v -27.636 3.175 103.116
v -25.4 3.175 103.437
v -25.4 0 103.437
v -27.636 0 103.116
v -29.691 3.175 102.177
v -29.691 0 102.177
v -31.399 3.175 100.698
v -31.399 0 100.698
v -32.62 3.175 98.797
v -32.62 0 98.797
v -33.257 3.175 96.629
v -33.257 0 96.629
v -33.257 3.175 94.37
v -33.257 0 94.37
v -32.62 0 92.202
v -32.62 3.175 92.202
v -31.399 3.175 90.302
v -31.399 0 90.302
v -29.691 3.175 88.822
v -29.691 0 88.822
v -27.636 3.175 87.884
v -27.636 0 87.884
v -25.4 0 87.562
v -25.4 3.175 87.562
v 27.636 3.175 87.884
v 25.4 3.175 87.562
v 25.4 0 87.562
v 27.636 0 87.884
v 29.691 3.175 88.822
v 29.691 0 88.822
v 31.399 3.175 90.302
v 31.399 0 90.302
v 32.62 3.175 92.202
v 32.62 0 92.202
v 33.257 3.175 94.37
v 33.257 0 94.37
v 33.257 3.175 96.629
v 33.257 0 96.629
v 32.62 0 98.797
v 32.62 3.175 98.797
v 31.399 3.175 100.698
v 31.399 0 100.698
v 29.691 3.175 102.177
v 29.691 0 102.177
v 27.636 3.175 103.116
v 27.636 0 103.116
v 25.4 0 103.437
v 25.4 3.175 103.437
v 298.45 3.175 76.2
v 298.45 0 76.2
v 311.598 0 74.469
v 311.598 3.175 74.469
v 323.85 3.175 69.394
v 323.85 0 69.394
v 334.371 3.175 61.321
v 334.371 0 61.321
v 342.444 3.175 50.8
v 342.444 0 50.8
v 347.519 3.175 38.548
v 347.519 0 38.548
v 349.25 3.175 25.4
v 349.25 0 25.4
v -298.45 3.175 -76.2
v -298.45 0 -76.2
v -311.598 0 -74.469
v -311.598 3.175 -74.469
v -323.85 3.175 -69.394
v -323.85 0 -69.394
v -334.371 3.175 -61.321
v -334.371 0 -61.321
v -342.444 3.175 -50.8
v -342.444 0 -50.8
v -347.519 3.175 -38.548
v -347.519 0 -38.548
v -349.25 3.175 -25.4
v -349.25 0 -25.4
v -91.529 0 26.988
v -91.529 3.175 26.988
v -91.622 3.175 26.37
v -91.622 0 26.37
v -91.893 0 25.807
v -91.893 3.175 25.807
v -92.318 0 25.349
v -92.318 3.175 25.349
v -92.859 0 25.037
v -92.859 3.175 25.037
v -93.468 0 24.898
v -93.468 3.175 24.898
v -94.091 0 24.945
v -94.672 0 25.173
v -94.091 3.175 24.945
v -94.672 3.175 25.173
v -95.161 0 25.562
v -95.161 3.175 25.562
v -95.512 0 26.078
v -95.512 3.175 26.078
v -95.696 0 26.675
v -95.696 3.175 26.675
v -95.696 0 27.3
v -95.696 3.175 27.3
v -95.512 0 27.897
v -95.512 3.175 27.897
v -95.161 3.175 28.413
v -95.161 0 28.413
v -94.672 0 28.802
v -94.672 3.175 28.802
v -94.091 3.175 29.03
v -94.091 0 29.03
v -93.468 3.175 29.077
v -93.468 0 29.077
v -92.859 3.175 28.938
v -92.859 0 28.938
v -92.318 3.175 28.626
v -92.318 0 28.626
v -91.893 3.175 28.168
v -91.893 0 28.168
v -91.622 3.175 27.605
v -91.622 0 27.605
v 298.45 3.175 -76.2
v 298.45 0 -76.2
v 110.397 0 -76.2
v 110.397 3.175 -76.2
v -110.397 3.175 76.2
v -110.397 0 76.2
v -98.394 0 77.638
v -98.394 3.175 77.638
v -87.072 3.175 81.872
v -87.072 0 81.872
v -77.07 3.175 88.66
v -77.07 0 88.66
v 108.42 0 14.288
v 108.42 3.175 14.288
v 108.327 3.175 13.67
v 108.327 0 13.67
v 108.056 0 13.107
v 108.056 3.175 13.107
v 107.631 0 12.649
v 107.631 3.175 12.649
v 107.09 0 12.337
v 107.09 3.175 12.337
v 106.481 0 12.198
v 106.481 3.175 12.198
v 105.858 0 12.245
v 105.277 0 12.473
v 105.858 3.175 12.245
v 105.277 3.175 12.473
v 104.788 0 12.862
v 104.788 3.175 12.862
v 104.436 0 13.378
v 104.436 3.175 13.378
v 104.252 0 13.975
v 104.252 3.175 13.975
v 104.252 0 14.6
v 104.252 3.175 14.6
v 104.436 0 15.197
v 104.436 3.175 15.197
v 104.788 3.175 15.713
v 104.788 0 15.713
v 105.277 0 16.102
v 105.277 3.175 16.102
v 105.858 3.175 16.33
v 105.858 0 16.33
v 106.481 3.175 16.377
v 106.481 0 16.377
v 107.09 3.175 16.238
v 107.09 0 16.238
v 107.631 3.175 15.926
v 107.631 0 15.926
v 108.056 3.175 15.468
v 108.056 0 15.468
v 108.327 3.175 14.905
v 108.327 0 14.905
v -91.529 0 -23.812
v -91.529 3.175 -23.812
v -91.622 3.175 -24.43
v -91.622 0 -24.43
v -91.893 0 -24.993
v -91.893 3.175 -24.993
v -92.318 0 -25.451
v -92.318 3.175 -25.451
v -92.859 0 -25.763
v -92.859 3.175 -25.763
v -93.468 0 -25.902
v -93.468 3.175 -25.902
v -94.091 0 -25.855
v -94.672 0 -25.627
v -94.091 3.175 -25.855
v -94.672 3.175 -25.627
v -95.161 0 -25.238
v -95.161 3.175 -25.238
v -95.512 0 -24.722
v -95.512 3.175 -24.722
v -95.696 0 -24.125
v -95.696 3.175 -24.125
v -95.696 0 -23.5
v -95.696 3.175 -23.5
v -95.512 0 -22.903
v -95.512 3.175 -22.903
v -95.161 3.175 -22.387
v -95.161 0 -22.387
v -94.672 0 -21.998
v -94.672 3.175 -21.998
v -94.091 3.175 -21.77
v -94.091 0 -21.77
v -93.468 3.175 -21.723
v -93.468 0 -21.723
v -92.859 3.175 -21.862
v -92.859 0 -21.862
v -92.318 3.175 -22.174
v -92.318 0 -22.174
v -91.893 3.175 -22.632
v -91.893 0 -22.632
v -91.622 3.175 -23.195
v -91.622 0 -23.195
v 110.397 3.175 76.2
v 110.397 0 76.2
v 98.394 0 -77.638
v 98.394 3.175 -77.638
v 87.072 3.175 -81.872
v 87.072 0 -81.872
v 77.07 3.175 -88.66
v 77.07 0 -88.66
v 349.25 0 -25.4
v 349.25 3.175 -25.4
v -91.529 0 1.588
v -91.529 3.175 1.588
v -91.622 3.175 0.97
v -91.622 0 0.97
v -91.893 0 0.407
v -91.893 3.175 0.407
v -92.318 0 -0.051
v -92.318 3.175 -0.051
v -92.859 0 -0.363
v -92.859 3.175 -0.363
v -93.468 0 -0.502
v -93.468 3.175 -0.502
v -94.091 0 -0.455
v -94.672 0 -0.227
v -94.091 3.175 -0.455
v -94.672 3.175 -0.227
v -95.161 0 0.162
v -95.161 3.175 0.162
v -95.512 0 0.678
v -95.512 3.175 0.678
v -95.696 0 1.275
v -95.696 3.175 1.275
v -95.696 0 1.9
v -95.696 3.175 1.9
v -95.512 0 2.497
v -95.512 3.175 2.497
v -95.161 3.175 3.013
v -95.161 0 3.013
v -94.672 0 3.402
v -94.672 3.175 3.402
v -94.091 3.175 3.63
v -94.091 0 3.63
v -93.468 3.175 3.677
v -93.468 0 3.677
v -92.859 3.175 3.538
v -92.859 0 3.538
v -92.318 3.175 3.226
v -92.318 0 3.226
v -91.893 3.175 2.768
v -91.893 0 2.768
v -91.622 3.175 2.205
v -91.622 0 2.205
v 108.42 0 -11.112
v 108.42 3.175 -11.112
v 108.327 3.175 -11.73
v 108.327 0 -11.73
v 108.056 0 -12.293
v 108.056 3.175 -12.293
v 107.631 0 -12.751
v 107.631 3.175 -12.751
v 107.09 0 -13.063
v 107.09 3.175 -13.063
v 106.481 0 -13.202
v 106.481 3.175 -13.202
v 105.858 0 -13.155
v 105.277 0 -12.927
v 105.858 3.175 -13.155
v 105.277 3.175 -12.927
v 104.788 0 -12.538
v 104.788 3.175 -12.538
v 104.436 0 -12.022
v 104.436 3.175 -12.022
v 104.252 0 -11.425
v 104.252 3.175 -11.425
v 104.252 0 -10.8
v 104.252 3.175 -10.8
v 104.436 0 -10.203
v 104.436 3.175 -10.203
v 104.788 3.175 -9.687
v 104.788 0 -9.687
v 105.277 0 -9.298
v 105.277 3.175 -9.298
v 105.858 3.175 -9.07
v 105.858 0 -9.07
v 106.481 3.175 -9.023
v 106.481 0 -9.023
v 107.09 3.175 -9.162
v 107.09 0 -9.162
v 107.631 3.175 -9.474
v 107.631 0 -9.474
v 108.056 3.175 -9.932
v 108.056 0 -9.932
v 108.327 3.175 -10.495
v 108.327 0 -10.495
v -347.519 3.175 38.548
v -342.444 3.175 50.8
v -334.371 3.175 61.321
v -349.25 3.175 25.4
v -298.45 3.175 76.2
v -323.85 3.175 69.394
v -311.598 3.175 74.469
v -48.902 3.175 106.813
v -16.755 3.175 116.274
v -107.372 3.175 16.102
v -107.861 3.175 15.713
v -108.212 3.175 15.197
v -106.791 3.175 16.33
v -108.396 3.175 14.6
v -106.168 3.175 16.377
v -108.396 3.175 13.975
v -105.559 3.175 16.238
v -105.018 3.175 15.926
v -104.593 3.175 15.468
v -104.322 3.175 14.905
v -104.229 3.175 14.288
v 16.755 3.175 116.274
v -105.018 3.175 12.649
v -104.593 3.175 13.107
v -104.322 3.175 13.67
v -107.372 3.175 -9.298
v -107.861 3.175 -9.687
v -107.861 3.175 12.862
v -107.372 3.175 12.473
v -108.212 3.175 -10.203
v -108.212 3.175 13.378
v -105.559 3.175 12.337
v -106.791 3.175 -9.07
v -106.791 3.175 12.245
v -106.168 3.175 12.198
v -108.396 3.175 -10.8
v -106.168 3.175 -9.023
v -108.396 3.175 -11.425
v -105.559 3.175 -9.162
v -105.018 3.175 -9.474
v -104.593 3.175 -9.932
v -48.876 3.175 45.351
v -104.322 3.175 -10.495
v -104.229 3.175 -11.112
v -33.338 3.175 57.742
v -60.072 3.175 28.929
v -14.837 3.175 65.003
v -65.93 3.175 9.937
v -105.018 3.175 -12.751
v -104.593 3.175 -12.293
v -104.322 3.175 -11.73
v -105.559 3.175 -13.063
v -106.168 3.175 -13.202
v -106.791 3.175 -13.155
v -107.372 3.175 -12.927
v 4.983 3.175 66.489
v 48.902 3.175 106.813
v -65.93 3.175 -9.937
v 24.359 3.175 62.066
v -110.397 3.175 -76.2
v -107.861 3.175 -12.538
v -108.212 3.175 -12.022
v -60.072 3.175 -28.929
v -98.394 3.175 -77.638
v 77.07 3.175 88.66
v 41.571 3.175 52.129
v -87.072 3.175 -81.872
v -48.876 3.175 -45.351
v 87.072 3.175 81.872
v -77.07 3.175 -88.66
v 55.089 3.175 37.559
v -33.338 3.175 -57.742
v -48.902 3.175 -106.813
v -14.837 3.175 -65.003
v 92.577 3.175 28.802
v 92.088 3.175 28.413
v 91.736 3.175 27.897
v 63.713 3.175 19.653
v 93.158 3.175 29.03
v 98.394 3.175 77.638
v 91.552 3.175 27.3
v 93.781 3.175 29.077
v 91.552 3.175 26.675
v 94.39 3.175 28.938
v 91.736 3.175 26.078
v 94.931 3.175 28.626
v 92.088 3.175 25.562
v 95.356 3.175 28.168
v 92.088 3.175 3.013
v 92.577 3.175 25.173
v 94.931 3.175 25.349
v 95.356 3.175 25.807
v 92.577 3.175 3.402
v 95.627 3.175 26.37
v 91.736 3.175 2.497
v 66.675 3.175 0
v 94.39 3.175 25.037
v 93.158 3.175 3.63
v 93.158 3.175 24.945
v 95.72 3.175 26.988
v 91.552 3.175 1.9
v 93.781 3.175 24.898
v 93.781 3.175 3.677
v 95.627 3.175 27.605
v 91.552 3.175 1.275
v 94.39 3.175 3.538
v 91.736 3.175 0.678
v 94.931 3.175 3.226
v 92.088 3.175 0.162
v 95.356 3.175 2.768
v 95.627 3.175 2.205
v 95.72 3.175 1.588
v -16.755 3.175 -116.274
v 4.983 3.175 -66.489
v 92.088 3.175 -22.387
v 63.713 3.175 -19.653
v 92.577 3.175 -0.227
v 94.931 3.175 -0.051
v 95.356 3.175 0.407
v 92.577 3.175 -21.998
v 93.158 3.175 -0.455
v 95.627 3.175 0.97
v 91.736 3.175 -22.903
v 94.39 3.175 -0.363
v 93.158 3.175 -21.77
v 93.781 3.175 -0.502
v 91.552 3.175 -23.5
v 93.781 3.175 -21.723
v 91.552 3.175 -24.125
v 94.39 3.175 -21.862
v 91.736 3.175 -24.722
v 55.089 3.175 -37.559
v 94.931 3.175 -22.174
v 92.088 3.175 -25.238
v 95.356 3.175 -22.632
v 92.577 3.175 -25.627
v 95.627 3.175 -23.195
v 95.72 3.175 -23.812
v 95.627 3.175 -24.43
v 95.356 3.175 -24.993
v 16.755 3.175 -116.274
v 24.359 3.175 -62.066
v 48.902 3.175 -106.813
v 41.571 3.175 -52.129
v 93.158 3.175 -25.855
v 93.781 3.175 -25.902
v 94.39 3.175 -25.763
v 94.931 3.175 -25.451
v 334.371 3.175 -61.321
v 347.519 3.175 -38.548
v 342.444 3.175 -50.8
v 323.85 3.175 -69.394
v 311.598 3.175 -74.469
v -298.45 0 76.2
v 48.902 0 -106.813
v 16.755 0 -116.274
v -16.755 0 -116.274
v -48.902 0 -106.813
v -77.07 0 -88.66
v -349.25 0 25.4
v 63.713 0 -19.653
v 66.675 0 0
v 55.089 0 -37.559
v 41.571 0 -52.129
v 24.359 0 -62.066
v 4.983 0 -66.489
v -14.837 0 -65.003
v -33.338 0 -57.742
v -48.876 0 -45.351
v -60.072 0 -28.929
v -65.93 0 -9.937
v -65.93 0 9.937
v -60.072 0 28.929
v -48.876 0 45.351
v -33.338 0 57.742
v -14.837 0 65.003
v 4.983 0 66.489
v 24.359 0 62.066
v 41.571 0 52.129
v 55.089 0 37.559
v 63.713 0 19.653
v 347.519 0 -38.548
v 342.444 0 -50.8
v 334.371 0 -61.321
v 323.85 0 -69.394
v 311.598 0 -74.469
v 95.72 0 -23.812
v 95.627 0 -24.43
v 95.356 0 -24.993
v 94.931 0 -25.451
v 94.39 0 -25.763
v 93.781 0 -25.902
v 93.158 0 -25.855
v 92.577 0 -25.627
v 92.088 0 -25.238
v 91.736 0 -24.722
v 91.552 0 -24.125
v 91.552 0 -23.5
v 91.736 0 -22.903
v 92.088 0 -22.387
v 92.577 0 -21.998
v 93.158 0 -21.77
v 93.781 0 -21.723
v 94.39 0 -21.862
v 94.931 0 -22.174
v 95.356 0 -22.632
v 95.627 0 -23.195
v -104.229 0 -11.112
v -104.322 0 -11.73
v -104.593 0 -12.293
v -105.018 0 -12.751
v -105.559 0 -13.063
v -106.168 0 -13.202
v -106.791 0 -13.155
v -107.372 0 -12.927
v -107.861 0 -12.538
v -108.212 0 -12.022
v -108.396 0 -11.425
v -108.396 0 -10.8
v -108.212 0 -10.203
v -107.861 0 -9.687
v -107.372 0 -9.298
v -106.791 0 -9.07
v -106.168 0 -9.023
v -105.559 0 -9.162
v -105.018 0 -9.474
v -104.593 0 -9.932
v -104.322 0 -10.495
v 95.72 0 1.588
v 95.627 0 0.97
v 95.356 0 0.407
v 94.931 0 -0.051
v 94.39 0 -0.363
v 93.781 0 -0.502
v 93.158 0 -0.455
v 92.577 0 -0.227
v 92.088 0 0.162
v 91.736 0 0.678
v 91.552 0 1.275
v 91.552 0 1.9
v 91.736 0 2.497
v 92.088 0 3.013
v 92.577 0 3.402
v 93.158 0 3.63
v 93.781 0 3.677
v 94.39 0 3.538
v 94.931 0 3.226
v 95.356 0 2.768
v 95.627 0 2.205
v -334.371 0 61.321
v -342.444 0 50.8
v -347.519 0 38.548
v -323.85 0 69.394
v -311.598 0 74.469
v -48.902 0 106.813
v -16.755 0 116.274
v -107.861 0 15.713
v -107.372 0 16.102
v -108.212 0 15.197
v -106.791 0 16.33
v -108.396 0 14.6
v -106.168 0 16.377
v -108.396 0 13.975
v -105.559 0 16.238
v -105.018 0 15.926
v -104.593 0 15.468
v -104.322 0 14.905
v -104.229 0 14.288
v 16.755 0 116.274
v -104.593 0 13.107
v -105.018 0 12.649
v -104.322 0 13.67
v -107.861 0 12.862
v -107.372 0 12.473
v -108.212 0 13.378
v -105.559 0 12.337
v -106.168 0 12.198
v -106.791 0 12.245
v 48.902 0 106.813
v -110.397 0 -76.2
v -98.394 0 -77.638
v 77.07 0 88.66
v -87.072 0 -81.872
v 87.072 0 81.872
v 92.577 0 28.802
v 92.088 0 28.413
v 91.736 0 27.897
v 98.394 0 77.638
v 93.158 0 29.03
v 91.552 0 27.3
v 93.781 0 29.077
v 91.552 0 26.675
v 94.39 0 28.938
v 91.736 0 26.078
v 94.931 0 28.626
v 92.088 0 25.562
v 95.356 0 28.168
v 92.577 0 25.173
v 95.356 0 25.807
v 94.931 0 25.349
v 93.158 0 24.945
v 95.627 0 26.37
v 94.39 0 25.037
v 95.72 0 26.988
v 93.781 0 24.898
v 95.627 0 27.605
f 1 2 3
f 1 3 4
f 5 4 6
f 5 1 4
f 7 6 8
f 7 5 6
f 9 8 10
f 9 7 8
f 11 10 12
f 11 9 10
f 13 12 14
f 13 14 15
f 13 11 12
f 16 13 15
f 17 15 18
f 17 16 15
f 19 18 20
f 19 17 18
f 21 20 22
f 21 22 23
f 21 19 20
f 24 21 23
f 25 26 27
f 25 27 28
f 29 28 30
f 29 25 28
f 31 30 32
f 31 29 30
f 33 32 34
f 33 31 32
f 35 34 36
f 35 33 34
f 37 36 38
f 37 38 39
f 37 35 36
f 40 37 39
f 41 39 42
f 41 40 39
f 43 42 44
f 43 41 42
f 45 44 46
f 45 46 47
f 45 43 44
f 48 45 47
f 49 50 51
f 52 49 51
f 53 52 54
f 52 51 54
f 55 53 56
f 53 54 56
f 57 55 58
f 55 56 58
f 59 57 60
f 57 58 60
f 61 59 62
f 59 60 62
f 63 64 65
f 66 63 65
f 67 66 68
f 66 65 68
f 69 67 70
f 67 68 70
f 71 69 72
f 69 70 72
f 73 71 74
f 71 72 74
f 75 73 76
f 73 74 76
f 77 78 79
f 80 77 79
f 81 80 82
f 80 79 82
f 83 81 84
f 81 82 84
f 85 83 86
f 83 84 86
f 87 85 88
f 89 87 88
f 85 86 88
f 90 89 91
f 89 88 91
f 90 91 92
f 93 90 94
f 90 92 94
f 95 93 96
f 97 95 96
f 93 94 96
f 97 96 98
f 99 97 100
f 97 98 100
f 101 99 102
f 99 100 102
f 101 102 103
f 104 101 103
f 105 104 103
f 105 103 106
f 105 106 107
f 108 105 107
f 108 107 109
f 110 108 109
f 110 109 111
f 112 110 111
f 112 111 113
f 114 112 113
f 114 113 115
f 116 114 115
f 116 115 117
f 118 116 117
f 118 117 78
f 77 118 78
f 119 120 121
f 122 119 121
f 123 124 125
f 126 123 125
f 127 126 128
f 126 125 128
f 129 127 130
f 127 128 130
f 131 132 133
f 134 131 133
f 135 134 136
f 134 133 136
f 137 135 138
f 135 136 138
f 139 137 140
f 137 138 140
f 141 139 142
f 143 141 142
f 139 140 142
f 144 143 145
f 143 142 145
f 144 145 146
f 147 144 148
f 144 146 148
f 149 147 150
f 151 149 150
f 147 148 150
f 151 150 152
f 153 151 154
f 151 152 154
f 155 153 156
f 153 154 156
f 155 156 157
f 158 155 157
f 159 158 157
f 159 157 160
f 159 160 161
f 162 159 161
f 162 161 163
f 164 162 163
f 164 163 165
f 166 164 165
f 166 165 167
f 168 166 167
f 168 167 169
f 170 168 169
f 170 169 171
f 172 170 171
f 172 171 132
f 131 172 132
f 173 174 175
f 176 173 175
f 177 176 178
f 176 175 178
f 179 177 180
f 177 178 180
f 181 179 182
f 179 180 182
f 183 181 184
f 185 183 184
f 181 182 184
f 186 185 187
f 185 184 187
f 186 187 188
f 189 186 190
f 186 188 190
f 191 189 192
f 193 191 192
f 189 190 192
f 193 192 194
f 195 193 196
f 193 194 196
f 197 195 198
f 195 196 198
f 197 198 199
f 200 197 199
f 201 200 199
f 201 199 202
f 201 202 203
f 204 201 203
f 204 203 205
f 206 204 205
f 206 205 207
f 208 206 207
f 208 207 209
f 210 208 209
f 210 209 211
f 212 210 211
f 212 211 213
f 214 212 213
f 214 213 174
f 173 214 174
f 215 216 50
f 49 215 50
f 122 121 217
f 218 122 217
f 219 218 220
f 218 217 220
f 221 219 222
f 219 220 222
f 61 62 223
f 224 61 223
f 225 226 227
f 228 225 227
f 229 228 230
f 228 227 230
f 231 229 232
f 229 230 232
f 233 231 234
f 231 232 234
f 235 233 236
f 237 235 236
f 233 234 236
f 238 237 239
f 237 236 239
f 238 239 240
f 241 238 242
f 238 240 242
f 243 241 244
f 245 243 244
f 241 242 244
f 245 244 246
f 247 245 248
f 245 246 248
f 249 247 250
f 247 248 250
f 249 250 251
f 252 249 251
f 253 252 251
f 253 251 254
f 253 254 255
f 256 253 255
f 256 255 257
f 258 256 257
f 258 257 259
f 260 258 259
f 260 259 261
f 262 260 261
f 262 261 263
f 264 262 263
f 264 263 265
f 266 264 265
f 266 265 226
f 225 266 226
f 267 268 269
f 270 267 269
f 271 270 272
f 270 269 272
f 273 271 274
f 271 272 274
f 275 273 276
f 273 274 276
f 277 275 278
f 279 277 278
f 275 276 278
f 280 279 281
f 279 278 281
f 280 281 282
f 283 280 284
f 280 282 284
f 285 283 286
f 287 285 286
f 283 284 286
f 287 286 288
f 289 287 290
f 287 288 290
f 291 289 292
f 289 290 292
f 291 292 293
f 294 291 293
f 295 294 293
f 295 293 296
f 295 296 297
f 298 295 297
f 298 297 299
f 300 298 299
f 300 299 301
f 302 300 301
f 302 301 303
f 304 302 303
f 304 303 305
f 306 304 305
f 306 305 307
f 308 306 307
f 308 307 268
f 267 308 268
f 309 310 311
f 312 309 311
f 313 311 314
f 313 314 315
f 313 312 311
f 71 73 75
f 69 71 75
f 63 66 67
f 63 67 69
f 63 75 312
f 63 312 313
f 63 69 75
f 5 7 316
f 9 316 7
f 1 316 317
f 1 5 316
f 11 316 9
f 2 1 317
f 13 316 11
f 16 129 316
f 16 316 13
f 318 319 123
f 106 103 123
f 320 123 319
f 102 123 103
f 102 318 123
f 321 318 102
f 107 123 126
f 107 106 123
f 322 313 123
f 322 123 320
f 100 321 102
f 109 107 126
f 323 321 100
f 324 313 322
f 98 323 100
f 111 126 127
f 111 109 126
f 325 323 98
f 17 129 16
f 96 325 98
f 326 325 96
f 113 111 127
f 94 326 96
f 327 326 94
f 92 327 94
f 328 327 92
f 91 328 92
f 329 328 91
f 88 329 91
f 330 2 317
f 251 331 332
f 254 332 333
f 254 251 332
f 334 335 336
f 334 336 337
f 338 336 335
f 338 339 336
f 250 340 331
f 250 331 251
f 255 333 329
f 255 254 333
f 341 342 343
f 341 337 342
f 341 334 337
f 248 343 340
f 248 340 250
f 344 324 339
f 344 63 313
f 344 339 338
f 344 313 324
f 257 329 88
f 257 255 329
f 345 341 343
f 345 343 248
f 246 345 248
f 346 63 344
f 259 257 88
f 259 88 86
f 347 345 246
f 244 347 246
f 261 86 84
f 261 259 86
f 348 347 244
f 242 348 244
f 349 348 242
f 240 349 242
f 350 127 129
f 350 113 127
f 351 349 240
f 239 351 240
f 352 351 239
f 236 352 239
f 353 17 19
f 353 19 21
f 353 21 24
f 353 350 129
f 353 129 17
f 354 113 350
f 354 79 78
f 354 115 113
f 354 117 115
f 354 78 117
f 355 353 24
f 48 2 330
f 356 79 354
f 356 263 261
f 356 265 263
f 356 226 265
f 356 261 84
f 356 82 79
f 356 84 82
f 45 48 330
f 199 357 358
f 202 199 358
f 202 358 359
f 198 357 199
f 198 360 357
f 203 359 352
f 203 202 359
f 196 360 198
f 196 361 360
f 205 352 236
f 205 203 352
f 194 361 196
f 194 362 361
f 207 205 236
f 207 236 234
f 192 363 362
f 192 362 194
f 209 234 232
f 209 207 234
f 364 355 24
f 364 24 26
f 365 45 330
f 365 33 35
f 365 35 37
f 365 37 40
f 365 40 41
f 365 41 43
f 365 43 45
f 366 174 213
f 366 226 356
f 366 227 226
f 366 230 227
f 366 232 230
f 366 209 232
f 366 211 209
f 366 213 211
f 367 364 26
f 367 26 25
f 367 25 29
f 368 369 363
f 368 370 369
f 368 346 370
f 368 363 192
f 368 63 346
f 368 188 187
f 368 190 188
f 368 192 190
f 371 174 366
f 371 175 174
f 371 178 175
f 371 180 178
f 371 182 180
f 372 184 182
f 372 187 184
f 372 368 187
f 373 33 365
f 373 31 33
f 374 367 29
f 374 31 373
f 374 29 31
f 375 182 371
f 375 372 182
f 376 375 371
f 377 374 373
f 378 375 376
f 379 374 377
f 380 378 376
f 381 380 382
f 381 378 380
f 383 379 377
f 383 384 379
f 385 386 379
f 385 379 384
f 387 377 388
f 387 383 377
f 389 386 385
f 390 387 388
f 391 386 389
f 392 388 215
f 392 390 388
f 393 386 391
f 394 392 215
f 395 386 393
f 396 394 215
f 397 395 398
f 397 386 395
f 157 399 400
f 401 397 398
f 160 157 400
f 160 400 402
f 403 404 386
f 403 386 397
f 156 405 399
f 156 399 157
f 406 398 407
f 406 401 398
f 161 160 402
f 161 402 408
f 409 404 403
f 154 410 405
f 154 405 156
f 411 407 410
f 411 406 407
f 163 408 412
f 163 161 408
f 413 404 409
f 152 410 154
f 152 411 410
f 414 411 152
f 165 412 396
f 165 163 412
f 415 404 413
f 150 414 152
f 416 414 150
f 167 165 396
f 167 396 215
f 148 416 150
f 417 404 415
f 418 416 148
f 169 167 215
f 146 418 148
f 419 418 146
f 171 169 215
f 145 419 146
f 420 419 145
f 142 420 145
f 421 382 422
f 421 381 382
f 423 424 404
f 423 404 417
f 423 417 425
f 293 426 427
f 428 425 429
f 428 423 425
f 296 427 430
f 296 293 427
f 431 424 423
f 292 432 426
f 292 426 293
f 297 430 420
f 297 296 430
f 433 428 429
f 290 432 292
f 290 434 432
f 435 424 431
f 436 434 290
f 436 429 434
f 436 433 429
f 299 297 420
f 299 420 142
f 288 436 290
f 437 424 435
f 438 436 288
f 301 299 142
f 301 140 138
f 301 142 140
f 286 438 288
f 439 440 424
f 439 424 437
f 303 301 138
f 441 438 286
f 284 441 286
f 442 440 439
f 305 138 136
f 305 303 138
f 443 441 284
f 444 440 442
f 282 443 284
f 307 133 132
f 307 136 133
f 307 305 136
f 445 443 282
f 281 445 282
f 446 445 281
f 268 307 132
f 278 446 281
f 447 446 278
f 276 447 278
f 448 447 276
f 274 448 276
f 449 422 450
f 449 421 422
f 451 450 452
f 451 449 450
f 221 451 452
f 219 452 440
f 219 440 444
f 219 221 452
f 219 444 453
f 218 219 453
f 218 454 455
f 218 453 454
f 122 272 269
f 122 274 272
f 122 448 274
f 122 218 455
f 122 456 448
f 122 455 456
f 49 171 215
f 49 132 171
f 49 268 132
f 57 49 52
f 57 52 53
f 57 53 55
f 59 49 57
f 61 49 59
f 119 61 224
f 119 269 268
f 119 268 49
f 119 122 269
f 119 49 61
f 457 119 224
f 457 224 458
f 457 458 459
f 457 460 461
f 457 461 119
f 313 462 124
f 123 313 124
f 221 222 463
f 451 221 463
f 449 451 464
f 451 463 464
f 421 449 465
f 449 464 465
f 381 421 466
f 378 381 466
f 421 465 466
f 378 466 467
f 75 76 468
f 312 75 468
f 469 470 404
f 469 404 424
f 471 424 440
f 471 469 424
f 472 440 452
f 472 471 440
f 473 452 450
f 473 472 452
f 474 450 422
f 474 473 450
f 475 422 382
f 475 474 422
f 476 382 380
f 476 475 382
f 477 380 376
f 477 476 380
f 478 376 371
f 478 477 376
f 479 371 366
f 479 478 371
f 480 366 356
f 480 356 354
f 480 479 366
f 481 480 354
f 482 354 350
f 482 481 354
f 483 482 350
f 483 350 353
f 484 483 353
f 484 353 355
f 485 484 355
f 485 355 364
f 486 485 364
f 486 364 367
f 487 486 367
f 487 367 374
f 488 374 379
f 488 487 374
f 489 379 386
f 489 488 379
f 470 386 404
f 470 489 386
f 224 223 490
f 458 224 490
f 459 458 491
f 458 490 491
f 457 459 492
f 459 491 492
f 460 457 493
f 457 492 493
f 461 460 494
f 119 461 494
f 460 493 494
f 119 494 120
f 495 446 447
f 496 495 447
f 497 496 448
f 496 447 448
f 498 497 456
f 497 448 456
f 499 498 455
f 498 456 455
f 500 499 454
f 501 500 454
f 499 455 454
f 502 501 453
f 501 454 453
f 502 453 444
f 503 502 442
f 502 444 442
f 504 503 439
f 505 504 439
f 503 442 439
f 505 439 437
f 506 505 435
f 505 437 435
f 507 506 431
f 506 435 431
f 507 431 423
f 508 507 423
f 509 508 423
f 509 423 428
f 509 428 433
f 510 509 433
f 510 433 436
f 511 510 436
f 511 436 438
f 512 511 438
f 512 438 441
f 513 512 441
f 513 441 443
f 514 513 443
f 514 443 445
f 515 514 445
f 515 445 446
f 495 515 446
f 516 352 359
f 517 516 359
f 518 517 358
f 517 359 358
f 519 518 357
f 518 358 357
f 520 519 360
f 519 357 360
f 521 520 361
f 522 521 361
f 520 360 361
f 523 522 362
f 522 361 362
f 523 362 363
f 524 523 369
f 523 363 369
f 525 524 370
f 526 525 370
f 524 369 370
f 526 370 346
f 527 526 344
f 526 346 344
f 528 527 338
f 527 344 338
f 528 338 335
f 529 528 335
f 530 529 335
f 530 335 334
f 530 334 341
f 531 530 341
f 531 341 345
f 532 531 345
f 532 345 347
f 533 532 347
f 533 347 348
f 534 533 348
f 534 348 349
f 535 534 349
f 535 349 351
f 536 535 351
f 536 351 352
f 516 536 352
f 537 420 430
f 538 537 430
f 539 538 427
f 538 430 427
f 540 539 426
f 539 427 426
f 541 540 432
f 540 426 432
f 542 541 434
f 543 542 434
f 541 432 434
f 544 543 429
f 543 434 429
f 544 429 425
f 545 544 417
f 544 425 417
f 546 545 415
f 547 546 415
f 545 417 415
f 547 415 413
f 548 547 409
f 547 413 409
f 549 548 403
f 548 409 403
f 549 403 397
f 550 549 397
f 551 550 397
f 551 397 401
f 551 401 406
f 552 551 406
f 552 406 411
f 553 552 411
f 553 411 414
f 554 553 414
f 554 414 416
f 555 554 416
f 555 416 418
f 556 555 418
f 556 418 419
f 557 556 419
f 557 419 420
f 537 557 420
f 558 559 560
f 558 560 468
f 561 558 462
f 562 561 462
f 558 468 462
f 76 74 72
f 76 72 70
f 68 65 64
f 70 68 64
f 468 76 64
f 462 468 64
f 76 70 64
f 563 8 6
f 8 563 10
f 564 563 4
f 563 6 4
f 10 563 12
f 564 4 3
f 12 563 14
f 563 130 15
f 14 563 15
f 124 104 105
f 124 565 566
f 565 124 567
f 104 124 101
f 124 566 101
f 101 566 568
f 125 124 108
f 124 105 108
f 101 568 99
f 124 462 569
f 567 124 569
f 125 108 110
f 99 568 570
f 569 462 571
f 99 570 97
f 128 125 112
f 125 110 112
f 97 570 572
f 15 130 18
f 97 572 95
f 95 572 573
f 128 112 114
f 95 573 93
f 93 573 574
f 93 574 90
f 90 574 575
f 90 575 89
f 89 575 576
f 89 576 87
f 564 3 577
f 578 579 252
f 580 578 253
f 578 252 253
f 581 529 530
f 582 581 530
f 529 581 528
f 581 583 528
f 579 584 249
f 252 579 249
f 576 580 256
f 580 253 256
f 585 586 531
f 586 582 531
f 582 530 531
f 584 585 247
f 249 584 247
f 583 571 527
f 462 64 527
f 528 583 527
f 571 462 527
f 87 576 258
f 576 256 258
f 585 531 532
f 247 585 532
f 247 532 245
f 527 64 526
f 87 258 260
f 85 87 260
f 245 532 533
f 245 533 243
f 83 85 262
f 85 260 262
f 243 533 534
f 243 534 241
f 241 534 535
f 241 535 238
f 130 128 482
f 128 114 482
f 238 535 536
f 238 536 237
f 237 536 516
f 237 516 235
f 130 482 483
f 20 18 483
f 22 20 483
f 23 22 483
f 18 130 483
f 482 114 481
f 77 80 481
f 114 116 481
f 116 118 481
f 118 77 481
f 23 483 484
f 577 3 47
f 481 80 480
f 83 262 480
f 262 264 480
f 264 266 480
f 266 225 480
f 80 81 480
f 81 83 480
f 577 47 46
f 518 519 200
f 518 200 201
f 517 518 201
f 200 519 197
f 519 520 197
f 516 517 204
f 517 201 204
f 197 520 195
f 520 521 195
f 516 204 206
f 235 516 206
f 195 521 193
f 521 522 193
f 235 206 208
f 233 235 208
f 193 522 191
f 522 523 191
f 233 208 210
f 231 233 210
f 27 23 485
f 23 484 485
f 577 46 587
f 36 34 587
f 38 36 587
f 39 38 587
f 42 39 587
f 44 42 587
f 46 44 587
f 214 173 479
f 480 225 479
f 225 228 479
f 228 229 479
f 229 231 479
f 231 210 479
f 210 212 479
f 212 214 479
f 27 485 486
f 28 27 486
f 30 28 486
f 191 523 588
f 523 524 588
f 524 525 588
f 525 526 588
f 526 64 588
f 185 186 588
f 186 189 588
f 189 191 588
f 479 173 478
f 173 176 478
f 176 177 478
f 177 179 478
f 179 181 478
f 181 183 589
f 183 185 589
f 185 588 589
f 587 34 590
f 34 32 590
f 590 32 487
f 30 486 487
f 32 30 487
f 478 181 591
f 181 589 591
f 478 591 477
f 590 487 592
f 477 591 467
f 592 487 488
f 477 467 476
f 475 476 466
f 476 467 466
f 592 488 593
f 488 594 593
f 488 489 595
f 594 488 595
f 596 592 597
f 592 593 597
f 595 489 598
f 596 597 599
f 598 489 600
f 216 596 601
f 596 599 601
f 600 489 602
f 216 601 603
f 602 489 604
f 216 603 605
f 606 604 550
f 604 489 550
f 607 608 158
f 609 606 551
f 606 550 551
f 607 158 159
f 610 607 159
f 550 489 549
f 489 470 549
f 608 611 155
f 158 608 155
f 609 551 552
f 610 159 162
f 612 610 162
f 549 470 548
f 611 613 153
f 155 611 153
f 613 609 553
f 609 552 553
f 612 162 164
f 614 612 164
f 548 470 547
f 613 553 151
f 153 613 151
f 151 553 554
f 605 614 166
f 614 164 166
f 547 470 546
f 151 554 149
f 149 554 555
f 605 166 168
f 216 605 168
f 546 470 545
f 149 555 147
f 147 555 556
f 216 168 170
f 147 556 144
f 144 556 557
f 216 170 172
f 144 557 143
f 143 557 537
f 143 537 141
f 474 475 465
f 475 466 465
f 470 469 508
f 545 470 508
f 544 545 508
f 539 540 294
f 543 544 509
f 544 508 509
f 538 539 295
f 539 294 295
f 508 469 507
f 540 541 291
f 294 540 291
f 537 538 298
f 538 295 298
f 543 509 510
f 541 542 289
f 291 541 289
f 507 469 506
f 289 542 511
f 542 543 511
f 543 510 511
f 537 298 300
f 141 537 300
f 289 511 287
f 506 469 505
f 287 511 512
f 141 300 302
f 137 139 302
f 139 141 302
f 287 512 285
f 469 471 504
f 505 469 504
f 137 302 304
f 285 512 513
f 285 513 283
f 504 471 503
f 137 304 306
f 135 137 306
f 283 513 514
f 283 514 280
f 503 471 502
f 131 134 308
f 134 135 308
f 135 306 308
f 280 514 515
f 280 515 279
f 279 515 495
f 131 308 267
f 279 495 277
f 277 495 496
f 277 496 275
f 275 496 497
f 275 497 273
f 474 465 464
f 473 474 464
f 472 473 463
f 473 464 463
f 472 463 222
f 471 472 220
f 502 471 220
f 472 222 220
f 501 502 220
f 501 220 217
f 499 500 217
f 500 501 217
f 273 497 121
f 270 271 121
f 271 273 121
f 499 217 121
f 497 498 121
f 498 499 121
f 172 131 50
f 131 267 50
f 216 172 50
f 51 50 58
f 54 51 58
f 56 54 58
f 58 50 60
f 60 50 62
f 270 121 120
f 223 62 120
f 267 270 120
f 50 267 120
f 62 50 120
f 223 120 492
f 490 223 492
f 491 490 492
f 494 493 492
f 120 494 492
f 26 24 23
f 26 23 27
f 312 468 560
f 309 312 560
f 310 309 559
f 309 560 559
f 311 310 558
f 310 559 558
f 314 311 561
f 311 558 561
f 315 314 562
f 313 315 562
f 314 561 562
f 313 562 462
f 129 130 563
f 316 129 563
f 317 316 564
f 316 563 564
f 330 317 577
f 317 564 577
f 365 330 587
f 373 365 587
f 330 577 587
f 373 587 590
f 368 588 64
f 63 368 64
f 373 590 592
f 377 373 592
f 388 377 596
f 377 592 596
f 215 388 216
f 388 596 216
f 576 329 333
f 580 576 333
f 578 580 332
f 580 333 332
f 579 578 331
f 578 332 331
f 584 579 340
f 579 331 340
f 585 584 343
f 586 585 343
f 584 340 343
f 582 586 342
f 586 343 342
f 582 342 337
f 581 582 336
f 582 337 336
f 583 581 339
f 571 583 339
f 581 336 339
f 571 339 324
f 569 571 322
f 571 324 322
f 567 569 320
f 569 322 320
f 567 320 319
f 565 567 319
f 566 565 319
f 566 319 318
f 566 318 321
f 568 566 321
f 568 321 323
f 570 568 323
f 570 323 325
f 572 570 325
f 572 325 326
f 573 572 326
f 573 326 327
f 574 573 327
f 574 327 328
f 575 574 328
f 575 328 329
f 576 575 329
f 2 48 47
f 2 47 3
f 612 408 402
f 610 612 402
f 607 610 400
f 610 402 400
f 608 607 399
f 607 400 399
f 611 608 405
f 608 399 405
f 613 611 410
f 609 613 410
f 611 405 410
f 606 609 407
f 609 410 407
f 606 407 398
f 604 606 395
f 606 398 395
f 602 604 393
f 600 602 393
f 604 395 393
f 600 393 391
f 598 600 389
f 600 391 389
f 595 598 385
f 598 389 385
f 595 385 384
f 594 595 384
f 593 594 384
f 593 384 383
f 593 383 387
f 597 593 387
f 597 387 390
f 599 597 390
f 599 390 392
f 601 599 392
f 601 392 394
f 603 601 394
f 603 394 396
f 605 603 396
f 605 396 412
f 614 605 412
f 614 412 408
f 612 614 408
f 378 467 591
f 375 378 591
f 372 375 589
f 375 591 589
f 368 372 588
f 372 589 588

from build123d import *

# Parameters (mm, degrees)
SKETCH1_R           = 66.675
BOSS_EXTRUDE1_DEPTH = 3.175
CUT_EXTRUDE4_DEPTH  = 3.175
SKETCH10_R          = 2.0955
CUT_EXTRUDE7_DEPTH  = 4.175


with BuildPart() as part:
    # Sketch1 → Boss-Extrude1 (new body)
    with BuildSketch(Plane(origin=(0, 0, 0), x_dir=(1, 0, 0), z_dir=(0, 1, 0))):
        with BuildLine():
            Line((-110.396900432, 76.2), (-298.45, 76.2))
            ThreePointArc((-298.45, 76.2), (-334.371024484, 61.321024484), (-349.25, 25.4))
            Line((-349.25, 25.4), (-349.25, -25.4))
            ThreePointArc((-349.25, -25.4), (-334.371024484, -61.321024484), (-298.45, -76.2))
            Line((-298.45, -76.2), (-110.396900432, -76.2))
            ThreePointArc((-110.396900432, -76.2), (-92.606633854, -79.41695244), (-77.069534264, -88.660377358))
            ThreePointArc((-77.069534264, -88.660377358), (0, -117.475), (77.069534264, -88.660377358))
            ThreePointArc((77.069534264, -88.660377358), (92.606633854, -79.41695244), (110.396900432, -76.2))
            Line((110.396900432, -76.2), (298.45, -76.2))
            ThreePointArc((298.45, -76.2), (334.371024484, -61.321024484), (349.25, -25.4))
            Line((349.25, -25.4), (349.25, 25.4))
            ThreePointArc((349.25, 25.4), (334.371024484, 61.321024484), (298.45, 76.2))
            Line((298.45, 76.2), (110.396900432, 76.2))
            ThreePointArc((110.396900432, 76.2), (92.606633854, 79.41695244), (77.069534264, 88.660377358))
            ThreePointArc((77.069534264, 88.660377358), (0, 117.475), (-77.069534264, 88.660377358))
            ThreePointArc((-77.069534264, 88.660377358), (-92.606633854, 79.41695244), (-110.396900432, 76.2))
        make_face()
        Circle(SKETCH1_R, mode=Mode.SUBTRACT)
    extrude(amount=BOSS_EXTRUDE1_DEPTH)

    # Sketch7 → Cut-Extrude4 (cut)
    with BuildSketch(Plane(origin=(0, 3.175, 0), x_dir=(1, 0, 0), z_dir=(0, 1, 0))):
        with BuildLine():
            Line((-25.4, -87.56211469), (25.4, -87.56211469))
            ThreePointArc((25.4, -87.56211469), (33.3375, -95.49961469), (25.4, -103.43711469))
            Line((25.4, -103.43711469), (-25.4, -103.43711469))
            ThreePointArc((-25.4, -103.43711469), (-33.3375, -95.49961469), (-25.4, -87.56211469))
        make_face()
    extrude(amount=-CUT_EXTRUDE4_DEPTH, mode=Mode.SUBTRACT)

    # Sketch10 → Cut-Extrude7 (cut, through all)
    with BuildSketch(Plane(origin=(0, 3.175, 0), x_dir=(1, 0, 0), z_dir=(0, 1, 0))):
        with Locations((-93.6244, -26.9875)):
            Circle(SKETCH10_R)
        with Locations((-106.3244, -14.2875)):
            Circle(SKETCH10_R)
        with Locations((-93.6244, -1.5875)):
            Circle(SKETCH10_R)
        with Locations((-106.3244, 11.1125)):
            Circle(SKETCH10_R)
        with Locations((-93.6244, 23.8125)):
            Circle(SKETCH10_R)
        with Locations((93.6244, -26.9875)):
            Circle(SKETCH10_R)
        with Locations((106.3244, -14.2875)):
            Circle(SKETCH10_R)
        with Locations((93.6244, -1.5875)):
            Circle(SKETCH10_R)
        with Locations((106.3244, 11.1125)):
            Circle(SKETCH10_R)
        with Locations((93.6244, 23.8125)):
            Circle(SKETCH10_R)
    extrude(amount=-CUT_EXTRUDE7_DEPTH, mode=Mode.SUBTRACT)


solid = part.part
